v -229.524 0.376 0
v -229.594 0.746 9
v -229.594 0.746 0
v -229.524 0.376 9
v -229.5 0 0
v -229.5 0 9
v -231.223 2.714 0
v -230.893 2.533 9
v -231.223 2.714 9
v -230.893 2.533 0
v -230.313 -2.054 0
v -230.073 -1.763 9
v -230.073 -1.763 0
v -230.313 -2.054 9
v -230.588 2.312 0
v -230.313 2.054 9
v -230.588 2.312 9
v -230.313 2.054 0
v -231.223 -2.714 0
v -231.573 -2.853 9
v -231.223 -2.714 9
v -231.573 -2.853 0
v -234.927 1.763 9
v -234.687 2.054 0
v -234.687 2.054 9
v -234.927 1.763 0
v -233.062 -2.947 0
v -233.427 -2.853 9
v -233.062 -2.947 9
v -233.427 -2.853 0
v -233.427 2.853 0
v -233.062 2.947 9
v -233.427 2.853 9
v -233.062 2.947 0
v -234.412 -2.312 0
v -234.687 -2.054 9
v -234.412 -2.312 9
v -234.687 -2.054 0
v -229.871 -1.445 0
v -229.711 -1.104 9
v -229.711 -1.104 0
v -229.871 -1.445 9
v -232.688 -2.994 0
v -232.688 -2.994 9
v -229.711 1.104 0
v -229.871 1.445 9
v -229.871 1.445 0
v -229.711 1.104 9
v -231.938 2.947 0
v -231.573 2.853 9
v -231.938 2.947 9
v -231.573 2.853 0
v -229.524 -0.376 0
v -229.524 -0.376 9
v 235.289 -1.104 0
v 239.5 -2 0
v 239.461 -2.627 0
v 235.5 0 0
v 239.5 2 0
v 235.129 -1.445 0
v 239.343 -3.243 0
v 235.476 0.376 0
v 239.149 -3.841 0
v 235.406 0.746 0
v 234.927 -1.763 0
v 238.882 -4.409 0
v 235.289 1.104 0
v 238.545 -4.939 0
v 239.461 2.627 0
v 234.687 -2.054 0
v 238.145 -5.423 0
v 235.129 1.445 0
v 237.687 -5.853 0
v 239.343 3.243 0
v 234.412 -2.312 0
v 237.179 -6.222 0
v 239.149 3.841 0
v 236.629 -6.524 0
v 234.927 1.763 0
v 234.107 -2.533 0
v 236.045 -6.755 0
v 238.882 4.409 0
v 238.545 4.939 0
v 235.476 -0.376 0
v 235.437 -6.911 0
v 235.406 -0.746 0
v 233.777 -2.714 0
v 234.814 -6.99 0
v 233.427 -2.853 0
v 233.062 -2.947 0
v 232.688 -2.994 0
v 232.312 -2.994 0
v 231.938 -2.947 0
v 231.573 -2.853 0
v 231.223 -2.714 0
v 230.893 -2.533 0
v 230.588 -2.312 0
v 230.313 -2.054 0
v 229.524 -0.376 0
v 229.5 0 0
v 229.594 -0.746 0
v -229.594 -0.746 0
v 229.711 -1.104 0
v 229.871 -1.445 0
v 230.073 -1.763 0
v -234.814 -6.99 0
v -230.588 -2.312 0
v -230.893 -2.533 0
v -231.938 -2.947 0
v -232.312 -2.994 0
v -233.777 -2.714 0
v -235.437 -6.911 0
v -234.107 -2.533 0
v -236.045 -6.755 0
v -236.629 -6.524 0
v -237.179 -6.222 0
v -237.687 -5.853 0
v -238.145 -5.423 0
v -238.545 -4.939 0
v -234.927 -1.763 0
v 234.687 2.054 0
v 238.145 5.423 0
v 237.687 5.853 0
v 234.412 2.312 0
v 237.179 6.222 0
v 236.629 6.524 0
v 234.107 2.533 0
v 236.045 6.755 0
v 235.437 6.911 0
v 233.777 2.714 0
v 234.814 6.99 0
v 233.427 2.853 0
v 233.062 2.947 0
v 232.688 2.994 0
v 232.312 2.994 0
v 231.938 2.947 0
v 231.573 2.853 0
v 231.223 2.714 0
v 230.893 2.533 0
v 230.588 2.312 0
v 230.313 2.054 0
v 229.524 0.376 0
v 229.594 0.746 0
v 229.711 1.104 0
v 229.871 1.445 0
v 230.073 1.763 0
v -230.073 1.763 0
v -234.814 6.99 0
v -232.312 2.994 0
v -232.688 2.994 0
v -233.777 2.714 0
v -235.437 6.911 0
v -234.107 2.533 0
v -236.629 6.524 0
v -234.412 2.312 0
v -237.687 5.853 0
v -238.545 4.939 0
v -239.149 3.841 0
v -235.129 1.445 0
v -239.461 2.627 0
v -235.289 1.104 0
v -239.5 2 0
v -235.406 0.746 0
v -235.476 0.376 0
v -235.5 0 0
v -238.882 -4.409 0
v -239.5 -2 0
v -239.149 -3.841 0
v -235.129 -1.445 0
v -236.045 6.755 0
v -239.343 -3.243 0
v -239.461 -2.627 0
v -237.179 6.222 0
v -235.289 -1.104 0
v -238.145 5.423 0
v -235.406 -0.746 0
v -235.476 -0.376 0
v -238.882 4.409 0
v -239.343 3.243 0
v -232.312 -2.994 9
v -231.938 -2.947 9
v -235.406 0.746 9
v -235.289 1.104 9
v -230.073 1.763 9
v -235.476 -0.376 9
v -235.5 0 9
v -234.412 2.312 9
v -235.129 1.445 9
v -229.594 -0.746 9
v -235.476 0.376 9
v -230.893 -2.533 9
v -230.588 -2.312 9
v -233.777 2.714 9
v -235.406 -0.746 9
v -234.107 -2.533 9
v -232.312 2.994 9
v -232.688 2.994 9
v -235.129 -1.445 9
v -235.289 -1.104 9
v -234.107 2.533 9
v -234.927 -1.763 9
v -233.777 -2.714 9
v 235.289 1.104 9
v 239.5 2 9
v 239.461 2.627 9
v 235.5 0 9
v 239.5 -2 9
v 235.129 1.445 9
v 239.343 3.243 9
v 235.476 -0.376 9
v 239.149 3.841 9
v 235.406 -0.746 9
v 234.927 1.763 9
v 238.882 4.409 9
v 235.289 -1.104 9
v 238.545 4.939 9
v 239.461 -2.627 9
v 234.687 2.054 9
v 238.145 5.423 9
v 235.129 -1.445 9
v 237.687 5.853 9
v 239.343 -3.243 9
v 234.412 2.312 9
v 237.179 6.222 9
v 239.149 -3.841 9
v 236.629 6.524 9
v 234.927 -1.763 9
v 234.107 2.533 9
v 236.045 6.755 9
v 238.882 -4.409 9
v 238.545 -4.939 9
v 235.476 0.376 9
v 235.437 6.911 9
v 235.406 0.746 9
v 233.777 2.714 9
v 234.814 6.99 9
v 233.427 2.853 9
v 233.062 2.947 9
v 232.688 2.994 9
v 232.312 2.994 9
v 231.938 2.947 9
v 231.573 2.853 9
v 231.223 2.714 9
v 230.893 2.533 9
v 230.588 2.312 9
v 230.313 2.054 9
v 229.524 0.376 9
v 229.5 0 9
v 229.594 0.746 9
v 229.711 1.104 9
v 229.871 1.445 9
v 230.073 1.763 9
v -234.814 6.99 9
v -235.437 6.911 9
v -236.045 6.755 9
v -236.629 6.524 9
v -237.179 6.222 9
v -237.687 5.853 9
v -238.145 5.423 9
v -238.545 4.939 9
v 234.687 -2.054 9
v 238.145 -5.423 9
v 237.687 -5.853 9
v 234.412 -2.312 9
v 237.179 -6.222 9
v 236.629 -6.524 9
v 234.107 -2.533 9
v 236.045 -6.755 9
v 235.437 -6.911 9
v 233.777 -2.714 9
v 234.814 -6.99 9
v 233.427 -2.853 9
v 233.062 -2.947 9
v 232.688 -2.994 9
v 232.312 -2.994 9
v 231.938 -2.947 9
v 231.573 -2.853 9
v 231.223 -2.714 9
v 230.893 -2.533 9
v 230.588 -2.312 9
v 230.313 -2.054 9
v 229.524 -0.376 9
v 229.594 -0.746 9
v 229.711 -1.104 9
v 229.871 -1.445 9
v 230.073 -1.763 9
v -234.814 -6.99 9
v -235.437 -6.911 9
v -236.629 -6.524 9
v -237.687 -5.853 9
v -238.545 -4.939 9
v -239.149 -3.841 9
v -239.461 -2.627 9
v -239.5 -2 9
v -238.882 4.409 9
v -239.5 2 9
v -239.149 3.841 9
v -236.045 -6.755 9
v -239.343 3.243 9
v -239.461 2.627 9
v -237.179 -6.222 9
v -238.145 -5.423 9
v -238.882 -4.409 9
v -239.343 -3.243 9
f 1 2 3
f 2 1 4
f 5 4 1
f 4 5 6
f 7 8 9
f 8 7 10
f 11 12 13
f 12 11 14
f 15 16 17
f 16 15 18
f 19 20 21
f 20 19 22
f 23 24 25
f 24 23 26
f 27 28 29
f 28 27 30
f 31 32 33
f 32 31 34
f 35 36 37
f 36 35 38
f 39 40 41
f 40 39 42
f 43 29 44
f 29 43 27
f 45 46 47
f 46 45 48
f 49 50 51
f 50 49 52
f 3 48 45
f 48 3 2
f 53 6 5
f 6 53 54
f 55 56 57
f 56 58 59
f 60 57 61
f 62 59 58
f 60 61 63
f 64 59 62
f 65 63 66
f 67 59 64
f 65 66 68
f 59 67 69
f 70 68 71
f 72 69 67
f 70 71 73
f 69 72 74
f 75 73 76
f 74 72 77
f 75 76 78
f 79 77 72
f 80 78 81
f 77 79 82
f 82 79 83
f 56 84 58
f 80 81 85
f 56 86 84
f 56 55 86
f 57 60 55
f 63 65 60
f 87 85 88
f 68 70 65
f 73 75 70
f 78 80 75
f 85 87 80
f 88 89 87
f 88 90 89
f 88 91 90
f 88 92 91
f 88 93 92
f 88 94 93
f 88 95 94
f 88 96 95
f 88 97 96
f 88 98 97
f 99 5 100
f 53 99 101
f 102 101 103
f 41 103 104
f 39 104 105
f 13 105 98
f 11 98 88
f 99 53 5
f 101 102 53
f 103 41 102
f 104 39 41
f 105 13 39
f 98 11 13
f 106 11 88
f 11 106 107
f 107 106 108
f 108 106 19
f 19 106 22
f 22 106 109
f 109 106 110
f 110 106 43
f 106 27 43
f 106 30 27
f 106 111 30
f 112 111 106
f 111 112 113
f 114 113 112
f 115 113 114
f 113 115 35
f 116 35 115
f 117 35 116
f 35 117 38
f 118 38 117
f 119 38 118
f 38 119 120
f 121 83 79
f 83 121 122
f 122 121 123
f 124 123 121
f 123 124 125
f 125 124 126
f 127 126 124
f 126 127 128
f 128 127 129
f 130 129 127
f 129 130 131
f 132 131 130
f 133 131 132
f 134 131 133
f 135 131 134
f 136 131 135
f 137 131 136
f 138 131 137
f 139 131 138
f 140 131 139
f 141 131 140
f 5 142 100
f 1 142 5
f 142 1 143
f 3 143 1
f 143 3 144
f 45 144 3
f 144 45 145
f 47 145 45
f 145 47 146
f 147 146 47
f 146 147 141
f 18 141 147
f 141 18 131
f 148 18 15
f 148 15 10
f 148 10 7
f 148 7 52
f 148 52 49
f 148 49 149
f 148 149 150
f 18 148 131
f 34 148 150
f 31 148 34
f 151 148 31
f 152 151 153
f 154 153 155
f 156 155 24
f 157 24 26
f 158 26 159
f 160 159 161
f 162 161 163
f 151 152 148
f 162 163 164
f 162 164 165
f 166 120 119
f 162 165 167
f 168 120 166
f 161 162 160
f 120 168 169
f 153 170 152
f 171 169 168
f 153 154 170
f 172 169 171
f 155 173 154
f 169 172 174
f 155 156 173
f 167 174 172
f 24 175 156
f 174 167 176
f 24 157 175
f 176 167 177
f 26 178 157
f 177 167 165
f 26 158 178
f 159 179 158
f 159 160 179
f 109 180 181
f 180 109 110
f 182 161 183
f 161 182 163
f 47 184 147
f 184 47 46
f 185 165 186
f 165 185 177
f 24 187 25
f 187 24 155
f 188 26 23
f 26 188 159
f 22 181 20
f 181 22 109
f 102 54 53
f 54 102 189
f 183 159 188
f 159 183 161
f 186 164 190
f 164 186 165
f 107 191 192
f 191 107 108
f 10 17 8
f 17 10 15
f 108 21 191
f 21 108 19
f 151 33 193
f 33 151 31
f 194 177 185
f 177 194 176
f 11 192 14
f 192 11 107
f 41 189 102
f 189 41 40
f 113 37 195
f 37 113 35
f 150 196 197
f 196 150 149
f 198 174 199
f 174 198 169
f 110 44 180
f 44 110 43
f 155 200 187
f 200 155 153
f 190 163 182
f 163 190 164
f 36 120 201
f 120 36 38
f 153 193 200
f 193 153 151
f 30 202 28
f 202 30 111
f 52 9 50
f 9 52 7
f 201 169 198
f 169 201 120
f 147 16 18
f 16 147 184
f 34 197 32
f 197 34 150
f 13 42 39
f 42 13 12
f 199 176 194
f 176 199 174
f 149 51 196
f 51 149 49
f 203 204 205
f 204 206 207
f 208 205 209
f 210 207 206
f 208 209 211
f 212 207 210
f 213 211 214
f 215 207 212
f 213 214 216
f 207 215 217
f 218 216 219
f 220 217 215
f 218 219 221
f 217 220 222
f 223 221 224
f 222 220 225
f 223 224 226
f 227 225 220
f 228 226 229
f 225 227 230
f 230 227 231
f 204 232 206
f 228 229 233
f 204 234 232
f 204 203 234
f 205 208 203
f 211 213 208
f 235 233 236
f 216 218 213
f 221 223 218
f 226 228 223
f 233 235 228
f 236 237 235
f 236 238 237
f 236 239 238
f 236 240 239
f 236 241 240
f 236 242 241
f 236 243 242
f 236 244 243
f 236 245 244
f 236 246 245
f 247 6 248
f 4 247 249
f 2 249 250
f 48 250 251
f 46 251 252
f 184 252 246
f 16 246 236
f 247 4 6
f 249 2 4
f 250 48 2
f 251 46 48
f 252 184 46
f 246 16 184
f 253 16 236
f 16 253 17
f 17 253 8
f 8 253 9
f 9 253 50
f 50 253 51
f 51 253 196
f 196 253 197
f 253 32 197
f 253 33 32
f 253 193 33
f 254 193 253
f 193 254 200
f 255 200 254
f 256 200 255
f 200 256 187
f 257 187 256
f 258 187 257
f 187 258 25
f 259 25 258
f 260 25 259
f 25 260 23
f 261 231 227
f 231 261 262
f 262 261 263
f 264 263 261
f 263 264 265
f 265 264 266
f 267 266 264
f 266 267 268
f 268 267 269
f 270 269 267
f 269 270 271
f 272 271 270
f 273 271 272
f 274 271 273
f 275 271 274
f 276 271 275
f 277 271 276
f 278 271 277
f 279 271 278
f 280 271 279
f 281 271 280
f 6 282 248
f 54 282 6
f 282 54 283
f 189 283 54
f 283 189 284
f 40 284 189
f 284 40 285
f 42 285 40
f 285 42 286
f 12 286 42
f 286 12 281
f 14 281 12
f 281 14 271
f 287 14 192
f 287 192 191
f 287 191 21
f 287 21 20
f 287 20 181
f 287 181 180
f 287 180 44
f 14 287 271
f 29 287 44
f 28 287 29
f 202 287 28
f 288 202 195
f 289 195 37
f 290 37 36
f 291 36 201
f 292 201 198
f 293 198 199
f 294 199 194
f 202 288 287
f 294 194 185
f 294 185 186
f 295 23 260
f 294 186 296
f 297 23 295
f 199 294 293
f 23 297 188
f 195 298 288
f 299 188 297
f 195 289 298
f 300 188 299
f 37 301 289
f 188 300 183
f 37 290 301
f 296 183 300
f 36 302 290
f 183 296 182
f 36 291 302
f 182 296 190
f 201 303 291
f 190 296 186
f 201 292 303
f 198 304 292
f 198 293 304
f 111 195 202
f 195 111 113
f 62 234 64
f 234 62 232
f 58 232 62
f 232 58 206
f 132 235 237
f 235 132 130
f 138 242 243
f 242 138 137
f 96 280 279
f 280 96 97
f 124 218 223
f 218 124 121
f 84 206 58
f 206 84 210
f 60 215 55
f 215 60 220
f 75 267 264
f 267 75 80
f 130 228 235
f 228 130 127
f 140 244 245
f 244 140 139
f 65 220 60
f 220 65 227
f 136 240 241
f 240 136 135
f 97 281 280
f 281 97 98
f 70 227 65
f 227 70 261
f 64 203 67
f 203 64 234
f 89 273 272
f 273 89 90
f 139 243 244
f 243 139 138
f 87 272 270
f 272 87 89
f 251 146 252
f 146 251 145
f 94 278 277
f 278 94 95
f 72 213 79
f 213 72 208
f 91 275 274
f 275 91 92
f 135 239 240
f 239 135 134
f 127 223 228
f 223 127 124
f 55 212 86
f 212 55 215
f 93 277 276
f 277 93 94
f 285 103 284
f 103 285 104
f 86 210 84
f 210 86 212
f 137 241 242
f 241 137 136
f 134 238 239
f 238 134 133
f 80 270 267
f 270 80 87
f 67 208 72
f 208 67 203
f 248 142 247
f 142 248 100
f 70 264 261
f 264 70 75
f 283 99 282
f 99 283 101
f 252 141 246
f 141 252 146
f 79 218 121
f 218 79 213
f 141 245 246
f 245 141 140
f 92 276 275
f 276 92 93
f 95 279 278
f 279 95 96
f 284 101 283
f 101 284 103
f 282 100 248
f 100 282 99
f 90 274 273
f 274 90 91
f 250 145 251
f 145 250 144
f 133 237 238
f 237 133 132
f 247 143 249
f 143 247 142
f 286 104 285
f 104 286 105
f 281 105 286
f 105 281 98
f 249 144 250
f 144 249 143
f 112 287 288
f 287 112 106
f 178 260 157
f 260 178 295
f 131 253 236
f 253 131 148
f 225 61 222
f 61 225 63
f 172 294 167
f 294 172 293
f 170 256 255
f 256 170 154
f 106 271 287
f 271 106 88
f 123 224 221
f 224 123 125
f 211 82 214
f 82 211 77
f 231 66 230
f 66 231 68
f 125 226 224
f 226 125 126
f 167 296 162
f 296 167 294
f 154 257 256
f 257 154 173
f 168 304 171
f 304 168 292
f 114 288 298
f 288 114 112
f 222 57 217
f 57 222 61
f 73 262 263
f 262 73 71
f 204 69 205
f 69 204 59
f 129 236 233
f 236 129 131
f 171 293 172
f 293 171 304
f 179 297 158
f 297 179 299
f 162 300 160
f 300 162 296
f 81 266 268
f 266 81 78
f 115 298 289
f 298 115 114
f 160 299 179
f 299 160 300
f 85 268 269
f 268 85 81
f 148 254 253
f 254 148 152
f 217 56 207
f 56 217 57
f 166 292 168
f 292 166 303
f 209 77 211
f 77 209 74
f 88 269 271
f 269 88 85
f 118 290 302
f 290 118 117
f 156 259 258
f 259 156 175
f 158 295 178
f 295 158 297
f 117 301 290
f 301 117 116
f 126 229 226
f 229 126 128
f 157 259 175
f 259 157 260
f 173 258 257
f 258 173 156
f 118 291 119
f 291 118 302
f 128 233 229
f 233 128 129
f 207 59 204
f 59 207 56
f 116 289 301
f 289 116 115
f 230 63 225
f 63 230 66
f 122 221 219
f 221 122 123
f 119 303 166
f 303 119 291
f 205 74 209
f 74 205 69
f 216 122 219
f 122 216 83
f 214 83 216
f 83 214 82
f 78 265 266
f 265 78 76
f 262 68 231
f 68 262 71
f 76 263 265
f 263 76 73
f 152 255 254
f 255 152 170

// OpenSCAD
$fn = 50;


difference() {
	union() {
		hull() {
			translate(v = [-234.5000000000, 2.0000000000, 0]) {
				cylinder(h = 9, r = 5);
			}
			translate(v = [234.5000000000, 2.0000000000, 0]) {
				cylinder(h = 9, r = 5);
			}
			translate(v = [-234.5000000000, -2.0000000000, 0]) {
				cylinder(h = 9, r = 5);
			}
			translate(v = [234.5000000000, -2.0000000000, 0]) {
				cylinder(h = 9, r = 5);
			}
		}
	}
	union() {
		translate(v = [-232.5000000000, 0.0000000000, 0]) {
			cylinder(h = 9, r = 3.0000000000);
		}
		translate(v = [232.5000000000, 0.0000000000, 0]) {
			cylinder(h = 9, r = 3.0000000000);
		}
		translate(v = [-232.5000000000, 0.0000000000, 0]) {
			cylinder(h = 9, r = 1.5000000000);
		}
		translate(v = [232.5000000000, 0.0000000000, 0]) {
			cylinder(h = 9, r = 1.5000000000);
		}
		translate(v = [-232.5000000000, 0.0000000000, 0]) {
			cylinder(h = 9, r = 1.5000000000);
		}
		translate(v = [232.5000000000, 0.0000000000, 0]) {
			cylinder(h = 9, r = 1.5000000000);
		}
		translate(v = [-232.5000000000, 0.0000000000, 0]) {
			cylinder(h = 9, r = 1.5000000000);
		}
		translate(v = [232.5000000000, 0.0000000000, 0]) {
			cylinder(h = 9, r = 1.5000000000);
		}
	}
}
